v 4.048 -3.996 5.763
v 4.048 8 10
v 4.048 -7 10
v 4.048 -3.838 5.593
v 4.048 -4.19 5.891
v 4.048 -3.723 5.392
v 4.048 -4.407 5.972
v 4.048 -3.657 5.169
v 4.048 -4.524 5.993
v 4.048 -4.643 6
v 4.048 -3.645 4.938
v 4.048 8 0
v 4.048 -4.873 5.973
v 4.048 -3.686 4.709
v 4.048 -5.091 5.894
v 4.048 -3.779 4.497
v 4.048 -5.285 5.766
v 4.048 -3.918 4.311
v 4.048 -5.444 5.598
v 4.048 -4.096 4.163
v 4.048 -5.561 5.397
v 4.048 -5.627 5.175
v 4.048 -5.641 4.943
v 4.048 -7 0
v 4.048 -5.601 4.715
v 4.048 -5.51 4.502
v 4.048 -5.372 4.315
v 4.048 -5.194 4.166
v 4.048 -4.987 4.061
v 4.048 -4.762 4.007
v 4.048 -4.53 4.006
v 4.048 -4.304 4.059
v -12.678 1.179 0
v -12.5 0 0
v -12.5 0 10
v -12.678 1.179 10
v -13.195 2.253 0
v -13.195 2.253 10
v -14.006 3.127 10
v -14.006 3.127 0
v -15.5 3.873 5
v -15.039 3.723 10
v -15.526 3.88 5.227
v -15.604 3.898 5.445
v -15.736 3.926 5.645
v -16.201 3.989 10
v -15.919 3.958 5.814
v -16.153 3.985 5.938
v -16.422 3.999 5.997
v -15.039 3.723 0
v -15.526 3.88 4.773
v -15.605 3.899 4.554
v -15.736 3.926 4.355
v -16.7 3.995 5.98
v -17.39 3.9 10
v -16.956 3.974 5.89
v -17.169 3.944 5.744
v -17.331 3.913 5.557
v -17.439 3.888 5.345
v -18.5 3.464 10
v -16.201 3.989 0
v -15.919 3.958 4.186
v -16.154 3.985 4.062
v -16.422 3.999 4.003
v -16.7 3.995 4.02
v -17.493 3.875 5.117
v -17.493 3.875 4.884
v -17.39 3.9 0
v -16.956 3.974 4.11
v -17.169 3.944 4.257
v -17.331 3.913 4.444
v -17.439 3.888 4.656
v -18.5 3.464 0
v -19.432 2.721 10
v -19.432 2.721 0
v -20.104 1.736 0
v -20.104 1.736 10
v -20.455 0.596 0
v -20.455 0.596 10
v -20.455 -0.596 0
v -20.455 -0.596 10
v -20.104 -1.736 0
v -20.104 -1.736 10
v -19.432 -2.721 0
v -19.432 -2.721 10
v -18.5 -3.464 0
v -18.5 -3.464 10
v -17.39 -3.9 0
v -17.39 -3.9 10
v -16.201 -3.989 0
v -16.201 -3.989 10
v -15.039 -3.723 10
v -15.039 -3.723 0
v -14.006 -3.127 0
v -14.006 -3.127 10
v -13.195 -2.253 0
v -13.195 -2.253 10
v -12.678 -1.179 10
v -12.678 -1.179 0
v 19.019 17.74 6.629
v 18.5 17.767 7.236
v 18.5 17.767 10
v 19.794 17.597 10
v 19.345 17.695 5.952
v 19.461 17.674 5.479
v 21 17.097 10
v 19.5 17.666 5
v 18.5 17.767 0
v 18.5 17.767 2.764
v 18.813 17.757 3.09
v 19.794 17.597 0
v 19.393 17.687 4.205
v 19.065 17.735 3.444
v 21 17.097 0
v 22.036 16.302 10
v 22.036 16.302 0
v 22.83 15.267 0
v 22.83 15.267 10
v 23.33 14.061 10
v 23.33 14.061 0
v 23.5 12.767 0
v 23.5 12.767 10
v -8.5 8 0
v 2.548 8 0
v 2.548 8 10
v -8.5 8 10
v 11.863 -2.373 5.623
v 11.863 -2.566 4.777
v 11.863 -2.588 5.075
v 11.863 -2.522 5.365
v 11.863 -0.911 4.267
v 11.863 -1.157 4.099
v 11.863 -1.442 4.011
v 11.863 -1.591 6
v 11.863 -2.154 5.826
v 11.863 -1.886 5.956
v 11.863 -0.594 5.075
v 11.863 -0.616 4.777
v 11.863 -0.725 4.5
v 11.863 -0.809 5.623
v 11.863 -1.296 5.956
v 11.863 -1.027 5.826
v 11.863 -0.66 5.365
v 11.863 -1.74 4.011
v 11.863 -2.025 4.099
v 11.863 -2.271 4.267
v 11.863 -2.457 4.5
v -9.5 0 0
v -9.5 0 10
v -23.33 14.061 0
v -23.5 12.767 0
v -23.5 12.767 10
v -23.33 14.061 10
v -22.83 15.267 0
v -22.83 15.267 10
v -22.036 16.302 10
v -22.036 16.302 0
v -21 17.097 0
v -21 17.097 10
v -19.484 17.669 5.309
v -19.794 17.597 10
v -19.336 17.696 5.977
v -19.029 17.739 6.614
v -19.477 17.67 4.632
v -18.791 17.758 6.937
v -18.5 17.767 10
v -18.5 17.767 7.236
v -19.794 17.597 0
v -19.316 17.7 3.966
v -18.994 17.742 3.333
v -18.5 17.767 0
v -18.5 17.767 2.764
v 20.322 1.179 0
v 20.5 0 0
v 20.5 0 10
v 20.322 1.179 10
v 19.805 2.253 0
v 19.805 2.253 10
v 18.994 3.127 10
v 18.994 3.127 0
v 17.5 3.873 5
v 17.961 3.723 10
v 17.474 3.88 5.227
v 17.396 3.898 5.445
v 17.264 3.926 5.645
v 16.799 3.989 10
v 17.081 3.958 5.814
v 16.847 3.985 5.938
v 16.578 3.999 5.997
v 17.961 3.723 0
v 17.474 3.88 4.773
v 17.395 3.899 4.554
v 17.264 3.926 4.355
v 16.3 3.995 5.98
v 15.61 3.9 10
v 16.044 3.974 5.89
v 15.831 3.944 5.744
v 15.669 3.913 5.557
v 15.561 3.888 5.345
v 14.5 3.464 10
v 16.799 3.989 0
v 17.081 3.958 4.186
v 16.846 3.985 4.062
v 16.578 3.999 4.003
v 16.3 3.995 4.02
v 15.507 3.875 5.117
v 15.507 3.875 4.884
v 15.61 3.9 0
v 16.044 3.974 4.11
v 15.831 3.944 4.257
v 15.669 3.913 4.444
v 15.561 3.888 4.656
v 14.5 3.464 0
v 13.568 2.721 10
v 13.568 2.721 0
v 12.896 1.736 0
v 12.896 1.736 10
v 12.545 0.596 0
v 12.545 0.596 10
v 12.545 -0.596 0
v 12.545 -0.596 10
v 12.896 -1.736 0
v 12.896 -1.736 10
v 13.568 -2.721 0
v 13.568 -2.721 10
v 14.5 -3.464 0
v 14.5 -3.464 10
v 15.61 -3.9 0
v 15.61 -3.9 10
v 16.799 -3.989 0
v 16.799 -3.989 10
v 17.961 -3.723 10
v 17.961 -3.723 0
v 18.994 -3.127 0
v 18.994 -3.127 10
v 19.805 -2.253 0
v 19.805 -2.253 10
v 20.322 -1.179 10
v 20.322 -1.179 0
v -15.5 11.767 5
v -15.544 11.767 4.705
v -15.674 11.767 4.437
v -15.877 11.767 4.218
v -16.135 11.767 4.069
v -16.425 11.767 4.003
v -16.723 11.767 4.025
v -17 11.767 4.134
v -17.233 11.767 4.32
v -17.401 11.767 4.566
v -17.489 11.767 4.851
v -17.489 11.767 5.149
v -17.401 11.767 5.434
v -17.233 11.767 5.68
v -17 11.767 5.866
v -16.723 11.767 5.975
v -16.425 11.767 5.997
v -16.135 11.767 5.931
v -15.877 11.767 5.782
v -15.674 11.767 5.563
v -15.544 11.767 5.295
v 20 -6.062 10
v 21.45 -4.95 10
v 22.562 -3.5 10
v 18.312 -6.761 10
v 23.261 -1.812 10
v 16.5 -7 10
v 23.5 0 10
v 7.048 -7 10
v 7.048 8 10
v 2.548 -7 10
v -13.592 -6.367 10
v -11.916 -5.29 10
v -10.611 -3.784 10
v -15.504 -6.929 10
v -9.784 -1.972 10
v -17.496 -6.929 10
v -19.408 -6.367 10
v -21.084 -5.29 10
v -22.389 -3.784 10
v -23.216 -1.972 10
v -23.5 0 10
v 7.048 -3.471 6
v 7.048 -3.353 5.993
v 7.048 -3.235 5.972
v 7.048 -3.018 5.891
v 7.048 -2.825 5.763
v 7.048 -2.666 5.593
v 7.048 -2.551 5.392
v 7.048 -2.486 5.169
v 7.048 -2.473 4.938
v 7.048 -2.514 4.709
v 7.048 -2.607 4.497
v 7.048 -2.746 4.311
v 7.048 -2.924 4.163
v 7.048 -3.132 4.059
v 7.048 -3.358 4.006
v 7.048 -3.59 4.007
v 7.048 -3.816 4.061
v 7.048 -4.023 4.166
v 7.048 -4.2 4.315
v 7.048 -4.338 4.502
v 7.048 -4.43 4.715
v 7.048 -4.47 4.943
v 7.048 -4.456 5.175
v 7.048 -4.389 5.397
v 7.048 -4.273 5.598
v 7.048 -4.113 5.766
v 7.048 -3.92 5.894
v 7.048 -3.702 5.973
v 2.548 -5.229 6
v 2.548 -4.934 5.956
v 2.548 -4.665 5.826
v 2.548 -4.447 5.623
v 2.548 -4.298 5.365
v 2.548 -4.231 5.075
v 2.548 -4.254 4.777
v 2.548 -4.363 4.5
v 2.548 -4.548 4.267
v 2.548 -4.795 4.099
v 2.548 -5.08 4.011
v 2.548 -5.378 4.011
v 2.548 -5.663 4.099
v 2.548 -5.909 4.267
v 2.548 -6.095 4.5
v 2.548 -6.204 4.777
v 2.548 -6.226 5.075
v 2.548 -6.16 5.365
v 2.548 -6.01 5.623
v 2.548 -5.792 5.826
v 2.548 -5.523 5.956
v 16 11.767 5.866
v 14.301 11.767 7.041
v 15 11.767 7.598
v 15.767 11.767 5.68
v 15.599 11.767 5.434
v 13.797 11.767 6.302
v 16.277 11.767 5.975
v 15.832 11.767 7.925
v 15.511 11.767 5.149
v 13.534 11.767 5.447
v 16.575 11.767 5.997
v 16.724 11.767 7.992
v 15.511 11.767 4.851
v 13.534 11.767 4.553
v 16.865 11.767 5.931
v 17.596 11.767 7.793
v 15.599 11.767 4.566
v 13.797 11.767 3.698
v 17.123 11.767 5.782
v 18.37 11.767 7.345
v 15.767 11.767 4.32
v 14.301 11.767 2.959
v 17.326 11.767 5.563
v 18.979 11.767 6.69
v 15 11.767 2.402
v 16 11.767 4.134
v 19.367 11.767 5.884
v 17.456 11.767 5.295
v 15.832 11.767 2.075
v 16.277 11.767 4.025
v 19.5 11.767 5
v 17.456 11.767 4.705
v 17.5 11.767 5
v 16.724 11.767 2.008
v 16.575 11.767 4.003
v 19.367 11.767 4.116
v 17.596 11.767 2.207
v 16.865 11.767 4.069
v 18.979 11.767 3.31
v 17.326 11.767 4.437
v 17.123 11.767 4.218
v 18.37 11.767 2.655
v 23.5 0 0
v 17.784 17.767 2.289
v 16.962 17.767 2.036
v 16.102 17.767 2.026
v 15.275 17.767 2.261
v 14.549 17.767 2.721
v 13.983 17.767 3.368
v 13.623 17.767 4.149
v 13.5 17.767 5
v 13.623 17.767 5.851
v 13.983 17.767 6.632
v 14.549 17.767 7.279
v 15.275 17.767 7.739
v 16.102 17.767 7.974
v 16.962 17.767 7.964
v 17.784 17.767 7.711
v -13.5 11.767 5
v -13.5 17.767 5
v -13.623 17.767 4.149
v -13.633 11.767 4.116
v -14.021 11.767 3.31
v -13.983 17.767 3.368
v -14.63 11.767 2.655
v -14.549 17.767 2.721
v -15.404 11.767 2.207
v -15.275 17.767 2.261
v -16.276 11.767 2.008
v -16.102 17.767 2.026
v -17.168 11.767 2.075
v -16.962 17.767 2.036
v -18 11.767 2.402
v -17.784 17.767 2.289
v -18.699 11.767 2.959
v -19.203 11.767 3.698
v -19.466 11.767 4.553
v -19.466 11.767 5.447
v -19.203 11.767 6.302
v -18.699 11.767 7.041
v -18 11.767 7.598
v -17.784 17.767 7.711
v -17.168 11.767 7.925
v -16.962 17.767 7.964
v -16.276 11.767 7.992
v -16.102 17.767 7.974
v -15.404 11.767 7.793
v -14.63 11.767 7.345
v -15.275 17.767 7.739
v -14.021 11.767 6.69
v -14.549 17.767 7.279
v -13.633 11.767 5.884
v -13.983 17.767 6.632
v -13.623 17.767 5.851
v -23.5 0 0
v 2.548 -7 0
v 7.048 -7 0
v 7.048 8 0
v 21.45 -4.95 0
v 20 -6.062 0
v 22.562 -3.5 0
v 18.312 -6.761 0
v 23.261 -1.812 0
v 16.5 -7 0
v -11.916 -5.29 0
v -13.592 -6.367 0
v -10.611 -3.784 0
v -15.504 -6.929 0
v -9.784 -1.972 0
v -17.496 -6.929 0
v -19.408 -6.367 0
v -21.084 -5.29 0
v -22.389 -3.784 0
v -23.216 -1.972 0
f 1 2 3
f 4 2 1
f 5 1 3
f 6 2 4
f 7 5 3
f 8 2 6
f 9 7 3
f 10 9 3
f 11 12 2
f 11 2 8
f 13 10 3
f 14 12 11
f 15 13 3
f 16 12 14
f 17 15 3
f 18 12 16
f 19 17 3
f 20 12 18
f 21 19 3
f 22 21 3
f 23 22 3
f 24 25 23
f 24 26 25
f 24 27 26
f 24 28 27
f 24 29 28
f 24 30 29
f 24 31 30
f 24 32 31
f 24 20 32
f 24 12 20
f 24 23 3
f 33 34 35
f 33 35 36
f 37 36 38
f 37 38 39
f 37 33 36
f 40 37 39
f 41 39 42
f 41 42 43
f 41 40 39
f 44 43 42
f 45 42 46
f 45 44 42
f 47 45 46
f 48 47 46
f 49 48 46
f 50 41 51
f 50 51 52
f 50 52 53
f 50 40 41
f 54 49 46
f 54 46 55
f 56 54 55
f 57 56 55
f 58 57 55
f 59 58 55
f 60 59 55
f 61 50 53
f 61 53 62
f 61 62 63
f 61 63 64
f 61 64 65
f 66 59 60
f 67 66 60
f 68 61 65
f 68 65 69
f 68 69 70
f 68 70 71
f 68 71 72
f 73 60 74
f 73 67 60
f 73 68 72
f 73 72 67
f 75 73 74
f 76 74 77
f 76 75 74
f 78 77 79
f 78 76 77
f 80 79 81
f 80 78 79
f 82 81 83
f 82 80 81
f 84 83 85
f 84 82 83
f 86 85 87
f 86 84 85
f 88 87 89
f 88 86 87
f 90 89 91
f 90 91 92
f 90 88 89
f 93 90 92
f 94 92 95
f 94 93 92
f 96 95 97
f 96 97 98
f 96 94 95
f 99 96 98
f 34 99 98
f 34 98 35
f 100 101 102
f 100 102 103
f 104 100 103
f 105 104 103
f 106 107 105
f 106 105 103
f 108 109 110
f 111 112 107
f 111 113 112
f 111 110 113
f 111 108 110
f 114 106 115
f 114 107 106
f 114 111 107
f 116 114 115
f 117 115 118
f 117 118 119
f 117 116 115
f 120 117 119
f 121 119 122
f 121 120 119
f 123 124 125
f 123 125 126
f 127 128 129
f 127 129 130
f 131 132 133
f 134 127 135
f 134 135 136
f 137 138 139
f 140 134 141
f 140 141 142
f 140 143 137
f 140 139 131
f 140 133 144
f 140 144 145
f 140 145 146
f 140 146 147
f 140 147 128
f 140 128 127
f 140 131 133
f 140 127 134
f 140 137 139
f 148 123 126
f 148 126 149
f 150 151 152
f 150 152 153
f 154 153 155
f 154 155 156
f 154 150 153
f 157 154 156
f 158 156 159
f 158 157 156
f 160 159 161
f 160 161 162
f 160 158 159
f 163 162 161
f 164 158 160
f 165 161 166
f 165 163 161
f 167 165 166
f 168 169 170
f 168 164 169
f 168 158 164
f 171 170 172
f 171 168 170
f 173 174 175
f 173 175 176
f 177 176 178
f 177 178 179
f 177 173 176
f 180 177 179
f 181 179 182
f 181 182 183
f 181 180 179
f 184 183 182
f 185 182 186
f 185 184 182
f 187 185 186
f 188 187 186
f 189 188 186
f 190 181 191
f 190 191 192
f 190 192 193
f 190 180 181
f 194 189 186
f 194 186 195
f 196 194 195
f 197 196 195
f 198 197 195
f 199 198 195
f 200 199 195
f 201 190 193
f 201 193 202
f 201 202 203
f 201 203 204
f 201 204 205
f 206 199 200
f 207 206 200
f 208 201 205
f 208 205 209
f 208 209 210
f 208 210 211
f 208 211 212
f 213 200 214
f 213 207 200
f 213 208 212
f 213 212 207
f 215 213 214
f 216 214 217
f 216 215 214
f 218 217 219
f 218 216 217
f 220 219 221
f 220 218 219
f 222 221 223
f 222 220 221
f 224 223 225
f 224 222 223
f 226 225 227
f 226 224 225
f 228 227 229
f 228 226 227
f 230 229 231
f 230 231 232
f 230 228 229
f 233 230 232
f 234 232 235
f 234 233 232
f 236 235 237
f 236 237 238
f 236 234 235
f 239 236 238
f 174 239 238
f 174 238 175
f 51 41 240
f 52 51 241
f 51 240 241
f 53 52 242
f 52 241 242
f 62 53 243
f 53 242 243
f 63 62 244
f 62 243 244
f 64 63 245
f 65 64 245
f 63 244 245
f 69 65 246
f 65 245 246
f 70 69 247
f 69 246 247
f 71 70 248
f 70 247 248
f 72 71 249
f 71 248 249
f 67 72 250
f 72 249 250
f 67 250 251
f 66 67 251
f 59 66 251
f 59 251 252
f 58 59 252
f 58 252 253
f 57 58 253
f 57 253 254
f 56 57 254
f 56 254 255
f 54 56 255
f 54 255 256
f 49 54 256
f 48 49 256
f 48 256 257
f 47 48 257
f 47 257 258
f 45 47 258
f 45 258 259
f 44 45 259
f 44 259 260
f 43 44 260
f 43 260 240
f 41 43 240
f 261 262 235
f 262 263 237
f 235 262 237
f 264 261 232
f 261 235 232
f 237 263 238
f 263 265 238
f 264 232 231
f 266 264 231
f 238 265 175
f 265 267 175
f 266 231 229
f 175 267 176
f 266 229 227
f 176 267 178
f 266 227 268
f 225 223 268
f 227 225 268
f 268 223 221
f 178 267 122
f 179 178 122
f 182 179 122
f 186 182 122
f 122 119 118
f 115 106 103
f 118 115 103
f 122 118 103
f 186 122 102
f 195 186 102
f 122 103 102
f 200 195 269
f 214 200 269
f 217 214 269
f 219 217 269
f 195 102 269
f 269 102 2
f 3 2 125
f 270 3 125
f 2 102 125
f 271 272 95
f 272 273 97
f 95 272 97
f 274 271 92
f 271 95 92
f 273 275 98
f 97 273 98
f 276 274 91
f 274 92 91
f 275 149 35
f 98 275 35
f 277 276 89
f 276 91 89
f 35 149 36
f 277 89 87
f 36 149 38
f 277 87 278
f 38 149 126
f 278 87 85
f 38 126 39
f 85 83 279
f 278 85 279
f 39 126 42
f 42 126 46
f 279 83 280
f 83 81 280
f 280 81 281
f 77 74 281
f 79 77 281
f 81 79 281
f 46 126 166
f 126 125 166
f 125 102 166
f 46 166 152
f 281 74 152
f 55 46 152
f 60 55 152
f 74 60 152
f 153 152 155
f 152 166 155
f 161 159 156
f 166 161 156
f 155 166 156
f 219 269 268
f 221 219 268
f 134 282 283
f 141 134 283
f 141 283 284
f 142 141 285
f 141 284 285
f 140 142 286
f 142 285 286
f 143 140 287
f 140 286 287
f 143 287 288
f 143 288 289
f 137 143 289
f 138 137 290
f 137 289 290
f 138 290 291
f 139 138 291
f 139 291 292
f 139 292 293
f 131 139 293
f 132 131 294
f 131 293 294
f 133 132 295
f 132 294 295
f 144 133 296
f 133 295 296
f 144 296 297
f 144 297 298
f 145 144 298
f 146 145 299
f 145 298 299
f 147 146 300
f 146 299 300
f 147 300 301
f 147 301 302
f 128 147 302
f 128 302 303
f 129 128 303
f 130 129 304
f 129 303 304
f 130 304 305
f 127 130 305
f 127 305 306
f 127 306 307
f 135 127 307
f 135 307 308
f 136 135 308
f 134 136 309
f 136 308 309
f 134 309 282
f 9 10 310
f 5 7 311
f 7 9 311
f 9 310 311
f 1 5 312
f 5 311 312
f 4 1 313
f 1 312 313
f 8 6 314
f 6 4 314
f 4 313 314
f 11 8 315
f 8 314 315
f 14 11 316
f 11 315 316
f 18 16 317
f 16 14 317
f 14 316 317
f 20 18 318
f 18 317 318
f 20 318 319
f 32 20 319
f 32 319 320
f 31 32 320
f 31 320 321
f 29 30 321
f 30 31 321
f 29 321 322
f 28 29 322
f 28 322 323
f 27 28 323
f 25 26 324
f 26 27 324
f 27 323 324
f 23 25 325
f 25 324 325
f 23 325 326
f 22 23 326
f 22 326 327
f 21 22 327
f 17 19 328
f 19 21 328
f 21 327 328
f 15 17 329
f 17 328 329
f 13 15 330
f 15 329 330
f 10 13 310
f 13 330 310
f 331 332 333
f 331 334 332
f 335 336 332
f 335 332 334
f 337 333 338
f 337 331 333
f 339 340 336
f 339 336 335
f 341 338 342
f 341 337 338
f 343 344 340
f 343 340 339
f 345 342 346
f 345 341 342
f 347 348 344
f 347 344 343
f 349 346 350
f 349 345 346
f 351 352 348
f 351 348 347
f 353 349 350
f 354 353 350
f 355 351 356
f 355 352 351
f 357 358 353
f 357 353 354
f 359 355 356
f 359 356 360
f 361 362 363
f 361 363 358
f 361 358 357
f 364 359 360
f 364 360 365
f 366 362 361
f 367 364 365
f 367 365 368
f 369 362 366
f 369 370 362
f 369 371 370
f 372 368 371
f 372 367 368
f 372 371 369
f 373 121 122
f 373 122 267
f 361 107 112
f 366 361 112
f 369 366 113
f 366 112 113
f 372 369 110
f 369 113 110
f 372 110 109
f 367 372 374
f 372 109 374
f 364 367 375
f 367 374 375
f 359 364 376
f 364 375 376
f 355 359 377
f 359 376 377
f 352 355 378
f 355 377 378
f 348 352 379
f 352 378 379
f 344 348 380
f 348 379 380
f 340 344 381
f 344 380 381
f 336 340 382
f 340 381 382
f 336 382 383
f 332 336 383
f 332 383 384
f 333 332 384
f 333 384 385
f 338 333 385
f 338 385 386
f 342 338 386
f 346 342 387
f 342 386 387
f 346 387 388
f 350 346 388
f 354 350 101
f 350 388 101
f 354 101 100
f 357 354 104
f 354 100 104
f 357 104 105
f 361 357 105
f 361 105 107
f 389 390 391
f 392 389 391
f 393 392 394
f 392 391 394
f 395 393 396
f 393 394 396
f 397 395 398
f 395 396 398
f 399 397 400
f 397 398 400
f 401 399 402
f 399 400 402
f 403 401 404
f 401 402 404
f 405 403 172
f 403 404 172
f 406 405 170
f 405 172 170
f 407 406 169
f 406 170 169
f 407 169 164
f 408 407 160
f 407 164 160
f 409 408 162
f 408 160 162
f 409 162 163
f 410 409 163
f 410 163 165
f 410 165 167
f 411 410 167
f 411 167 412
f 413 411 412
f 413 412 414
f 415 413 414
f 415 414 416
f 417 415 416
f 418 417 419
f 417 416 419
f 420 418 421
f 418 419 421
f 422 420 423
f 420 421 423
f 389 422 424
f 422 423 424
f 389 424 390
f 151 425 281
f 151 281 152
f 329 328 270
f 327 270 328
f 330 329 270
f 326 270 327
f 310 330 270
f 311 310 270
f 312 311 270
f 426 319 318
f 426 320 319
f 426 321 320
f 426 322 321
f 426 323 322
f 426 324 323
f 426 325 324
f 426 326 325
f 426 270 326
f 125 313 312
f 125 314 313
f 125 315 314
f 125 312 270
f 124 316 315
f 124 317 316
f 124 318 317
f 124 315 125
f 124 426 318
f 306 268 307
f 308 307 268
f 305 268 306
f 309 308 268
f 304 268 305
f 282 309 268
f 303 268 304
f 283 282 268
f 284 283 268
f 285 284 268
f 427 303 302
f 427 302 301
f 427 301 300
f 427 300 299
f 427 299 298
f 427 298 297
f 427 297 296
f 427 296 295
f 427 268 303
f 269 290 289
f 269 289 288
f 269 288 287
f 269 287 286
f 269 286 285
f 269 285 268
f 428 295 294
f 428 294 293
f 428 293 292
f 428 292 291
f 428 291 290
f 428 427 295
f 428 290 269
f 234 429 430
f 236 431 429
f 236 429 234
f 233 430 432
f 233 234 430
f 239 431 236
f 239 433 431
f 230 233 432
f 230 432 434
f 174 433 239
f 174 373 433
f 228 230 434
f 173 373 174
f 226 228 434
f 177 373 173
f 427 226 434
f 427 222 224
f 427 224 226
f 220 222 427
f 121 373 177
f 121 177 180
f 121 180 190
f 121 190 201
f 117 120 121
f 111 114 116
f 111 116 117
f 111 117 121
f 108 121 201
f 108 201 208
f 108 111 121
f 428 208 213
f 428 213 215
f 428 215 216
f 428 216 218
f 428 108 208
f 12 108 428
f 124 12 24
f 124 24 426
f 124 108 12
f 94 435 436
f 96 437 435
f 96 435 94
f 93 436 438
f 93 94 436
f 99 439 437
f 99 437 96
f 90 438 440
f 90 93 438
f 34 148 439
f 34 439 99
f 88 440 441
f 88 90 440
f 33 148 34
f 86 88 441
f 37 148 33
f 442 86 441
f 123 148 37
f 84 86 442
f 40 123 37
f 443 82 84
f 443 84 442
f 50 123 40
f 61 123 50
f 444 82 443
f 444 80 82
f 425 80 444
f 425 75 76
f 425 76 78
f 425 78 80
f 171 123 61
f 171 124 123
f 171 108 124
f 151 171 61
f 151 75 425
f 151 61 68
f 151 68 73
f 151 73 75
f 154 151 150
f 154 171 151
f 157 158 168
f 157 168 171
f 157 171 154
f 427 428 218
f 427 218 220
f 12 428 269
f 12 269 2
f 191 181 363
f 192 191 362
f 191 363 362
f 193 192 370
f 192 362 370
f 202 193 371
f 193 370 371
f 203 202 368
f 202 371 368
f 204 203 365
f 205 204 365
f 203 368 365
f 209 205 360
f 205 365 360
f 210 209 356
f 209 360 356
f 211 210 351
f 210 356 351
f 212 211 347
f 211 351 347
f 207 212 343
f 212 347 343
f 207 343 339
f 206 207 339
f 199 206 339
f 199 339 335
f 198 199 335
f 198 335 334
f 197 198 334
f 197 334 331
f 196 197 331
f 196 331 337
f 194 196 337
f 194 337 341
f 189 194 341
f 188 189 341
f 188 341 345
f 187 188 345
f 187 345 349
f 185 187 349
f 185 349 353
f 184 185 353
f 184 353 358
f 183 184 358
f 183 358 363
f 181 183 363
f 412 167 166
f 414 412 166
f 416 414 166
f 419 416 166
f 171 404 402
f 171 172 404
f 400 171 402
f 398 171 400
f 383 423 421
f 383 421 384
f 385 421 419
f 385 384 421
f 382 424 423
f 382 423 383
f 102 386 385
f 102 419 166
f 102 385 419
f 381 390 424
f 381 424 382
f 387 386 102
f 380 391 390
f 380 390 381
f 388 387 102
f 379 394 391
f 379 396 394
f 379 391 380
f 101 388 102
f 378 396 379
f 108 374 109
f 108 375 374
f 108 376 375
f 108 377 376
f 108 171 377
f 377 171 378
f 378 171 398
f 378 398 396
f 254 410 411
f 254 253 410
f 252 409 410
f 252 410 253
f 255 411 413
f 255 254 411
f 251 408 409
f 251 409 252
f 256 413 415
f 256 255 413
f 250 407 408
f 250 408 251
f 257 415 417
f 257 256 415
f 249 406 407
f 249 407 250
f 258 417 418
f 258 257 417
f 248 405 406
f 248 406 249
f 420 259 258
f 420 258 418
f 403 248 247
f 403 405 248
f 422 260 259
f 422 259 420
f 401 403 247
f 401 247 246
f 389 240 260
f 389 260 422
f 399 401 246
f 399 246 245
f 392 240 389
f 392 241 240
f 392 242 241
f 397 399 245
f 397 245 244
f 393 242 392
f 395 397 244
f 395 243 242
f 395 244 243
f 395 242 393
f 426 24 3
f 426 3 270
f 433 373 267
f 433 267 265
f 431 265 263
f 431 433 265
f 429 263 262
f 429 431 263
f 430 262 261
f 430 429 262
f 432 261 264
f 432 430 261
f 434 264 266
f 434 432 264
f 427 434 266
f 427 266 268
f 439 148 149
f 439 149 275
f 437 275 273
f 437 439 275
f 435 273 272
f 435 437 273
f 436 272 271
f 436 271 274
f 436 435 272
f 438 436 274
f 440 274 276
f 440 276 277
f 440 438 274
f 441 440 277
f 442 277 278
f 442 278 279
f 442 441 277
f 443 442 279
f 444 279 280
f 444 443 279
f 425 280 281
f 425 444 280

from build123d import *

# Parameters (mm, degrees)
ESBO_O1_R                = 4
RESSALTO_EXTRUS_O1_DEPTH = 10
ESBO_O2_R                = 1
CORTE_EXTRUS_O1_DEPTH    = 10
ESBO_O3_R                = 1
CORTE_EXTRUS_O2_DEPTH    = 20
ESBO_O5_R                = 3
CORTE_EXTRUS_O3_DEPTH    = 6


with BuildPart() as part:
    # Esboço1 → Ressalto-extrusão1 (new body)
    with BuildSketch(Plane.XY):
        with BuildLine():
            Line((-23.5, 0), (-23.5, 12.766875201))
            ThreePointArc((-23.5, 12.766875201), (-22.035533906, 16.302409107), (-18.5, 17.766875201))
            Line((-18.5, 17.766875201), (18.5, 17.766875201))
            ThreePointArc((18.5, 17.766875201), (22.035533906, 16.302409107), (23.5, 12.766875201))
            Line((23.5, 12.766875201), (23.5, 0))
            ThreePointArc((23.5, 0), (21.449747468, -4.949747468), (16.5, -7))
            Line((16.5, -7), (7.047816286, -7))
            Line((7.047816286, -7), (7.047816286, 8))
            Line((7.047816286, 8), (4.047816286, 8))
            Line((4.047816286, 8), (4.047816286, -7))
            Line((4.047816286, -7), (2.547816286, -7))
            Line((2.547816286, -7), (2.547816286, 8))
            Line((2.547816286, 8), (-8.5, 8))
            Line((-8.5, 8), (-9.5, 0))
            ThreePointArc((-9.5, 0), (-16.5, -7), (-23.5, 0))
        make_face()
        with Locations((-16.5, 0)):
            Circle(ESBO_O1_R, mode=Mode.SUBTRACT)
        with Locations((16.5, 0)):
            Circle(ESBO_O1_R, mode=Mode.SUBTRACT)
    extrude(amount=RESSALTO_EXTRUS_O1_DEPTH)

    # Esboço2 → Corte-extrusão1 (cut, along a direction that is not the sketch's normal)
    with BuildSketch(Plane.ZY.offset(-2.547816286)):
        with Locations((5, -5.228639013)):
            Circle(ESBO_O2_R)
    extrude(amount=-CORTE_EXTRUS_O1_DEPTH, dir=(-0.931482298, -0.363786654, 0), mode=Mode.SUBTRACT)

    # Esboço3 → Corte-extrusão2 (cut)
    with BuildSketch(Plane(origin=(0, 17.766875201, 0), x_dir=(1, 0, 0), z_dir=(0, 1, 0))):
        with Locations((-16.5, -5)):
            Circle(ESBO_O3_R)
        with Locations((16.5, -5)):
            Circle(ESBO_O3_R)
    extrude(amount=-CORTE_EXTRUS_O2_DEPTH, mode=Mode.SUBTRACT)

    # Esboço5 → Corte-extrusão3 (cut)
    with BuildSketch(Plane(origin=(0, 17.766875201, 0), x_dir=(1, 0, 0), z_dir=(0, 1, 0))):
        with Locations((-16.5, -5)):
            Circle(ESBO_O5_R)
        with Locations((16.5, -5)):
            Circle(ESBO_O5_R)
    extrude(amount=-CORTE_EXTRUS_O3_DEPTH, mode=Mode.SUBTRACT)


solid = part.part
